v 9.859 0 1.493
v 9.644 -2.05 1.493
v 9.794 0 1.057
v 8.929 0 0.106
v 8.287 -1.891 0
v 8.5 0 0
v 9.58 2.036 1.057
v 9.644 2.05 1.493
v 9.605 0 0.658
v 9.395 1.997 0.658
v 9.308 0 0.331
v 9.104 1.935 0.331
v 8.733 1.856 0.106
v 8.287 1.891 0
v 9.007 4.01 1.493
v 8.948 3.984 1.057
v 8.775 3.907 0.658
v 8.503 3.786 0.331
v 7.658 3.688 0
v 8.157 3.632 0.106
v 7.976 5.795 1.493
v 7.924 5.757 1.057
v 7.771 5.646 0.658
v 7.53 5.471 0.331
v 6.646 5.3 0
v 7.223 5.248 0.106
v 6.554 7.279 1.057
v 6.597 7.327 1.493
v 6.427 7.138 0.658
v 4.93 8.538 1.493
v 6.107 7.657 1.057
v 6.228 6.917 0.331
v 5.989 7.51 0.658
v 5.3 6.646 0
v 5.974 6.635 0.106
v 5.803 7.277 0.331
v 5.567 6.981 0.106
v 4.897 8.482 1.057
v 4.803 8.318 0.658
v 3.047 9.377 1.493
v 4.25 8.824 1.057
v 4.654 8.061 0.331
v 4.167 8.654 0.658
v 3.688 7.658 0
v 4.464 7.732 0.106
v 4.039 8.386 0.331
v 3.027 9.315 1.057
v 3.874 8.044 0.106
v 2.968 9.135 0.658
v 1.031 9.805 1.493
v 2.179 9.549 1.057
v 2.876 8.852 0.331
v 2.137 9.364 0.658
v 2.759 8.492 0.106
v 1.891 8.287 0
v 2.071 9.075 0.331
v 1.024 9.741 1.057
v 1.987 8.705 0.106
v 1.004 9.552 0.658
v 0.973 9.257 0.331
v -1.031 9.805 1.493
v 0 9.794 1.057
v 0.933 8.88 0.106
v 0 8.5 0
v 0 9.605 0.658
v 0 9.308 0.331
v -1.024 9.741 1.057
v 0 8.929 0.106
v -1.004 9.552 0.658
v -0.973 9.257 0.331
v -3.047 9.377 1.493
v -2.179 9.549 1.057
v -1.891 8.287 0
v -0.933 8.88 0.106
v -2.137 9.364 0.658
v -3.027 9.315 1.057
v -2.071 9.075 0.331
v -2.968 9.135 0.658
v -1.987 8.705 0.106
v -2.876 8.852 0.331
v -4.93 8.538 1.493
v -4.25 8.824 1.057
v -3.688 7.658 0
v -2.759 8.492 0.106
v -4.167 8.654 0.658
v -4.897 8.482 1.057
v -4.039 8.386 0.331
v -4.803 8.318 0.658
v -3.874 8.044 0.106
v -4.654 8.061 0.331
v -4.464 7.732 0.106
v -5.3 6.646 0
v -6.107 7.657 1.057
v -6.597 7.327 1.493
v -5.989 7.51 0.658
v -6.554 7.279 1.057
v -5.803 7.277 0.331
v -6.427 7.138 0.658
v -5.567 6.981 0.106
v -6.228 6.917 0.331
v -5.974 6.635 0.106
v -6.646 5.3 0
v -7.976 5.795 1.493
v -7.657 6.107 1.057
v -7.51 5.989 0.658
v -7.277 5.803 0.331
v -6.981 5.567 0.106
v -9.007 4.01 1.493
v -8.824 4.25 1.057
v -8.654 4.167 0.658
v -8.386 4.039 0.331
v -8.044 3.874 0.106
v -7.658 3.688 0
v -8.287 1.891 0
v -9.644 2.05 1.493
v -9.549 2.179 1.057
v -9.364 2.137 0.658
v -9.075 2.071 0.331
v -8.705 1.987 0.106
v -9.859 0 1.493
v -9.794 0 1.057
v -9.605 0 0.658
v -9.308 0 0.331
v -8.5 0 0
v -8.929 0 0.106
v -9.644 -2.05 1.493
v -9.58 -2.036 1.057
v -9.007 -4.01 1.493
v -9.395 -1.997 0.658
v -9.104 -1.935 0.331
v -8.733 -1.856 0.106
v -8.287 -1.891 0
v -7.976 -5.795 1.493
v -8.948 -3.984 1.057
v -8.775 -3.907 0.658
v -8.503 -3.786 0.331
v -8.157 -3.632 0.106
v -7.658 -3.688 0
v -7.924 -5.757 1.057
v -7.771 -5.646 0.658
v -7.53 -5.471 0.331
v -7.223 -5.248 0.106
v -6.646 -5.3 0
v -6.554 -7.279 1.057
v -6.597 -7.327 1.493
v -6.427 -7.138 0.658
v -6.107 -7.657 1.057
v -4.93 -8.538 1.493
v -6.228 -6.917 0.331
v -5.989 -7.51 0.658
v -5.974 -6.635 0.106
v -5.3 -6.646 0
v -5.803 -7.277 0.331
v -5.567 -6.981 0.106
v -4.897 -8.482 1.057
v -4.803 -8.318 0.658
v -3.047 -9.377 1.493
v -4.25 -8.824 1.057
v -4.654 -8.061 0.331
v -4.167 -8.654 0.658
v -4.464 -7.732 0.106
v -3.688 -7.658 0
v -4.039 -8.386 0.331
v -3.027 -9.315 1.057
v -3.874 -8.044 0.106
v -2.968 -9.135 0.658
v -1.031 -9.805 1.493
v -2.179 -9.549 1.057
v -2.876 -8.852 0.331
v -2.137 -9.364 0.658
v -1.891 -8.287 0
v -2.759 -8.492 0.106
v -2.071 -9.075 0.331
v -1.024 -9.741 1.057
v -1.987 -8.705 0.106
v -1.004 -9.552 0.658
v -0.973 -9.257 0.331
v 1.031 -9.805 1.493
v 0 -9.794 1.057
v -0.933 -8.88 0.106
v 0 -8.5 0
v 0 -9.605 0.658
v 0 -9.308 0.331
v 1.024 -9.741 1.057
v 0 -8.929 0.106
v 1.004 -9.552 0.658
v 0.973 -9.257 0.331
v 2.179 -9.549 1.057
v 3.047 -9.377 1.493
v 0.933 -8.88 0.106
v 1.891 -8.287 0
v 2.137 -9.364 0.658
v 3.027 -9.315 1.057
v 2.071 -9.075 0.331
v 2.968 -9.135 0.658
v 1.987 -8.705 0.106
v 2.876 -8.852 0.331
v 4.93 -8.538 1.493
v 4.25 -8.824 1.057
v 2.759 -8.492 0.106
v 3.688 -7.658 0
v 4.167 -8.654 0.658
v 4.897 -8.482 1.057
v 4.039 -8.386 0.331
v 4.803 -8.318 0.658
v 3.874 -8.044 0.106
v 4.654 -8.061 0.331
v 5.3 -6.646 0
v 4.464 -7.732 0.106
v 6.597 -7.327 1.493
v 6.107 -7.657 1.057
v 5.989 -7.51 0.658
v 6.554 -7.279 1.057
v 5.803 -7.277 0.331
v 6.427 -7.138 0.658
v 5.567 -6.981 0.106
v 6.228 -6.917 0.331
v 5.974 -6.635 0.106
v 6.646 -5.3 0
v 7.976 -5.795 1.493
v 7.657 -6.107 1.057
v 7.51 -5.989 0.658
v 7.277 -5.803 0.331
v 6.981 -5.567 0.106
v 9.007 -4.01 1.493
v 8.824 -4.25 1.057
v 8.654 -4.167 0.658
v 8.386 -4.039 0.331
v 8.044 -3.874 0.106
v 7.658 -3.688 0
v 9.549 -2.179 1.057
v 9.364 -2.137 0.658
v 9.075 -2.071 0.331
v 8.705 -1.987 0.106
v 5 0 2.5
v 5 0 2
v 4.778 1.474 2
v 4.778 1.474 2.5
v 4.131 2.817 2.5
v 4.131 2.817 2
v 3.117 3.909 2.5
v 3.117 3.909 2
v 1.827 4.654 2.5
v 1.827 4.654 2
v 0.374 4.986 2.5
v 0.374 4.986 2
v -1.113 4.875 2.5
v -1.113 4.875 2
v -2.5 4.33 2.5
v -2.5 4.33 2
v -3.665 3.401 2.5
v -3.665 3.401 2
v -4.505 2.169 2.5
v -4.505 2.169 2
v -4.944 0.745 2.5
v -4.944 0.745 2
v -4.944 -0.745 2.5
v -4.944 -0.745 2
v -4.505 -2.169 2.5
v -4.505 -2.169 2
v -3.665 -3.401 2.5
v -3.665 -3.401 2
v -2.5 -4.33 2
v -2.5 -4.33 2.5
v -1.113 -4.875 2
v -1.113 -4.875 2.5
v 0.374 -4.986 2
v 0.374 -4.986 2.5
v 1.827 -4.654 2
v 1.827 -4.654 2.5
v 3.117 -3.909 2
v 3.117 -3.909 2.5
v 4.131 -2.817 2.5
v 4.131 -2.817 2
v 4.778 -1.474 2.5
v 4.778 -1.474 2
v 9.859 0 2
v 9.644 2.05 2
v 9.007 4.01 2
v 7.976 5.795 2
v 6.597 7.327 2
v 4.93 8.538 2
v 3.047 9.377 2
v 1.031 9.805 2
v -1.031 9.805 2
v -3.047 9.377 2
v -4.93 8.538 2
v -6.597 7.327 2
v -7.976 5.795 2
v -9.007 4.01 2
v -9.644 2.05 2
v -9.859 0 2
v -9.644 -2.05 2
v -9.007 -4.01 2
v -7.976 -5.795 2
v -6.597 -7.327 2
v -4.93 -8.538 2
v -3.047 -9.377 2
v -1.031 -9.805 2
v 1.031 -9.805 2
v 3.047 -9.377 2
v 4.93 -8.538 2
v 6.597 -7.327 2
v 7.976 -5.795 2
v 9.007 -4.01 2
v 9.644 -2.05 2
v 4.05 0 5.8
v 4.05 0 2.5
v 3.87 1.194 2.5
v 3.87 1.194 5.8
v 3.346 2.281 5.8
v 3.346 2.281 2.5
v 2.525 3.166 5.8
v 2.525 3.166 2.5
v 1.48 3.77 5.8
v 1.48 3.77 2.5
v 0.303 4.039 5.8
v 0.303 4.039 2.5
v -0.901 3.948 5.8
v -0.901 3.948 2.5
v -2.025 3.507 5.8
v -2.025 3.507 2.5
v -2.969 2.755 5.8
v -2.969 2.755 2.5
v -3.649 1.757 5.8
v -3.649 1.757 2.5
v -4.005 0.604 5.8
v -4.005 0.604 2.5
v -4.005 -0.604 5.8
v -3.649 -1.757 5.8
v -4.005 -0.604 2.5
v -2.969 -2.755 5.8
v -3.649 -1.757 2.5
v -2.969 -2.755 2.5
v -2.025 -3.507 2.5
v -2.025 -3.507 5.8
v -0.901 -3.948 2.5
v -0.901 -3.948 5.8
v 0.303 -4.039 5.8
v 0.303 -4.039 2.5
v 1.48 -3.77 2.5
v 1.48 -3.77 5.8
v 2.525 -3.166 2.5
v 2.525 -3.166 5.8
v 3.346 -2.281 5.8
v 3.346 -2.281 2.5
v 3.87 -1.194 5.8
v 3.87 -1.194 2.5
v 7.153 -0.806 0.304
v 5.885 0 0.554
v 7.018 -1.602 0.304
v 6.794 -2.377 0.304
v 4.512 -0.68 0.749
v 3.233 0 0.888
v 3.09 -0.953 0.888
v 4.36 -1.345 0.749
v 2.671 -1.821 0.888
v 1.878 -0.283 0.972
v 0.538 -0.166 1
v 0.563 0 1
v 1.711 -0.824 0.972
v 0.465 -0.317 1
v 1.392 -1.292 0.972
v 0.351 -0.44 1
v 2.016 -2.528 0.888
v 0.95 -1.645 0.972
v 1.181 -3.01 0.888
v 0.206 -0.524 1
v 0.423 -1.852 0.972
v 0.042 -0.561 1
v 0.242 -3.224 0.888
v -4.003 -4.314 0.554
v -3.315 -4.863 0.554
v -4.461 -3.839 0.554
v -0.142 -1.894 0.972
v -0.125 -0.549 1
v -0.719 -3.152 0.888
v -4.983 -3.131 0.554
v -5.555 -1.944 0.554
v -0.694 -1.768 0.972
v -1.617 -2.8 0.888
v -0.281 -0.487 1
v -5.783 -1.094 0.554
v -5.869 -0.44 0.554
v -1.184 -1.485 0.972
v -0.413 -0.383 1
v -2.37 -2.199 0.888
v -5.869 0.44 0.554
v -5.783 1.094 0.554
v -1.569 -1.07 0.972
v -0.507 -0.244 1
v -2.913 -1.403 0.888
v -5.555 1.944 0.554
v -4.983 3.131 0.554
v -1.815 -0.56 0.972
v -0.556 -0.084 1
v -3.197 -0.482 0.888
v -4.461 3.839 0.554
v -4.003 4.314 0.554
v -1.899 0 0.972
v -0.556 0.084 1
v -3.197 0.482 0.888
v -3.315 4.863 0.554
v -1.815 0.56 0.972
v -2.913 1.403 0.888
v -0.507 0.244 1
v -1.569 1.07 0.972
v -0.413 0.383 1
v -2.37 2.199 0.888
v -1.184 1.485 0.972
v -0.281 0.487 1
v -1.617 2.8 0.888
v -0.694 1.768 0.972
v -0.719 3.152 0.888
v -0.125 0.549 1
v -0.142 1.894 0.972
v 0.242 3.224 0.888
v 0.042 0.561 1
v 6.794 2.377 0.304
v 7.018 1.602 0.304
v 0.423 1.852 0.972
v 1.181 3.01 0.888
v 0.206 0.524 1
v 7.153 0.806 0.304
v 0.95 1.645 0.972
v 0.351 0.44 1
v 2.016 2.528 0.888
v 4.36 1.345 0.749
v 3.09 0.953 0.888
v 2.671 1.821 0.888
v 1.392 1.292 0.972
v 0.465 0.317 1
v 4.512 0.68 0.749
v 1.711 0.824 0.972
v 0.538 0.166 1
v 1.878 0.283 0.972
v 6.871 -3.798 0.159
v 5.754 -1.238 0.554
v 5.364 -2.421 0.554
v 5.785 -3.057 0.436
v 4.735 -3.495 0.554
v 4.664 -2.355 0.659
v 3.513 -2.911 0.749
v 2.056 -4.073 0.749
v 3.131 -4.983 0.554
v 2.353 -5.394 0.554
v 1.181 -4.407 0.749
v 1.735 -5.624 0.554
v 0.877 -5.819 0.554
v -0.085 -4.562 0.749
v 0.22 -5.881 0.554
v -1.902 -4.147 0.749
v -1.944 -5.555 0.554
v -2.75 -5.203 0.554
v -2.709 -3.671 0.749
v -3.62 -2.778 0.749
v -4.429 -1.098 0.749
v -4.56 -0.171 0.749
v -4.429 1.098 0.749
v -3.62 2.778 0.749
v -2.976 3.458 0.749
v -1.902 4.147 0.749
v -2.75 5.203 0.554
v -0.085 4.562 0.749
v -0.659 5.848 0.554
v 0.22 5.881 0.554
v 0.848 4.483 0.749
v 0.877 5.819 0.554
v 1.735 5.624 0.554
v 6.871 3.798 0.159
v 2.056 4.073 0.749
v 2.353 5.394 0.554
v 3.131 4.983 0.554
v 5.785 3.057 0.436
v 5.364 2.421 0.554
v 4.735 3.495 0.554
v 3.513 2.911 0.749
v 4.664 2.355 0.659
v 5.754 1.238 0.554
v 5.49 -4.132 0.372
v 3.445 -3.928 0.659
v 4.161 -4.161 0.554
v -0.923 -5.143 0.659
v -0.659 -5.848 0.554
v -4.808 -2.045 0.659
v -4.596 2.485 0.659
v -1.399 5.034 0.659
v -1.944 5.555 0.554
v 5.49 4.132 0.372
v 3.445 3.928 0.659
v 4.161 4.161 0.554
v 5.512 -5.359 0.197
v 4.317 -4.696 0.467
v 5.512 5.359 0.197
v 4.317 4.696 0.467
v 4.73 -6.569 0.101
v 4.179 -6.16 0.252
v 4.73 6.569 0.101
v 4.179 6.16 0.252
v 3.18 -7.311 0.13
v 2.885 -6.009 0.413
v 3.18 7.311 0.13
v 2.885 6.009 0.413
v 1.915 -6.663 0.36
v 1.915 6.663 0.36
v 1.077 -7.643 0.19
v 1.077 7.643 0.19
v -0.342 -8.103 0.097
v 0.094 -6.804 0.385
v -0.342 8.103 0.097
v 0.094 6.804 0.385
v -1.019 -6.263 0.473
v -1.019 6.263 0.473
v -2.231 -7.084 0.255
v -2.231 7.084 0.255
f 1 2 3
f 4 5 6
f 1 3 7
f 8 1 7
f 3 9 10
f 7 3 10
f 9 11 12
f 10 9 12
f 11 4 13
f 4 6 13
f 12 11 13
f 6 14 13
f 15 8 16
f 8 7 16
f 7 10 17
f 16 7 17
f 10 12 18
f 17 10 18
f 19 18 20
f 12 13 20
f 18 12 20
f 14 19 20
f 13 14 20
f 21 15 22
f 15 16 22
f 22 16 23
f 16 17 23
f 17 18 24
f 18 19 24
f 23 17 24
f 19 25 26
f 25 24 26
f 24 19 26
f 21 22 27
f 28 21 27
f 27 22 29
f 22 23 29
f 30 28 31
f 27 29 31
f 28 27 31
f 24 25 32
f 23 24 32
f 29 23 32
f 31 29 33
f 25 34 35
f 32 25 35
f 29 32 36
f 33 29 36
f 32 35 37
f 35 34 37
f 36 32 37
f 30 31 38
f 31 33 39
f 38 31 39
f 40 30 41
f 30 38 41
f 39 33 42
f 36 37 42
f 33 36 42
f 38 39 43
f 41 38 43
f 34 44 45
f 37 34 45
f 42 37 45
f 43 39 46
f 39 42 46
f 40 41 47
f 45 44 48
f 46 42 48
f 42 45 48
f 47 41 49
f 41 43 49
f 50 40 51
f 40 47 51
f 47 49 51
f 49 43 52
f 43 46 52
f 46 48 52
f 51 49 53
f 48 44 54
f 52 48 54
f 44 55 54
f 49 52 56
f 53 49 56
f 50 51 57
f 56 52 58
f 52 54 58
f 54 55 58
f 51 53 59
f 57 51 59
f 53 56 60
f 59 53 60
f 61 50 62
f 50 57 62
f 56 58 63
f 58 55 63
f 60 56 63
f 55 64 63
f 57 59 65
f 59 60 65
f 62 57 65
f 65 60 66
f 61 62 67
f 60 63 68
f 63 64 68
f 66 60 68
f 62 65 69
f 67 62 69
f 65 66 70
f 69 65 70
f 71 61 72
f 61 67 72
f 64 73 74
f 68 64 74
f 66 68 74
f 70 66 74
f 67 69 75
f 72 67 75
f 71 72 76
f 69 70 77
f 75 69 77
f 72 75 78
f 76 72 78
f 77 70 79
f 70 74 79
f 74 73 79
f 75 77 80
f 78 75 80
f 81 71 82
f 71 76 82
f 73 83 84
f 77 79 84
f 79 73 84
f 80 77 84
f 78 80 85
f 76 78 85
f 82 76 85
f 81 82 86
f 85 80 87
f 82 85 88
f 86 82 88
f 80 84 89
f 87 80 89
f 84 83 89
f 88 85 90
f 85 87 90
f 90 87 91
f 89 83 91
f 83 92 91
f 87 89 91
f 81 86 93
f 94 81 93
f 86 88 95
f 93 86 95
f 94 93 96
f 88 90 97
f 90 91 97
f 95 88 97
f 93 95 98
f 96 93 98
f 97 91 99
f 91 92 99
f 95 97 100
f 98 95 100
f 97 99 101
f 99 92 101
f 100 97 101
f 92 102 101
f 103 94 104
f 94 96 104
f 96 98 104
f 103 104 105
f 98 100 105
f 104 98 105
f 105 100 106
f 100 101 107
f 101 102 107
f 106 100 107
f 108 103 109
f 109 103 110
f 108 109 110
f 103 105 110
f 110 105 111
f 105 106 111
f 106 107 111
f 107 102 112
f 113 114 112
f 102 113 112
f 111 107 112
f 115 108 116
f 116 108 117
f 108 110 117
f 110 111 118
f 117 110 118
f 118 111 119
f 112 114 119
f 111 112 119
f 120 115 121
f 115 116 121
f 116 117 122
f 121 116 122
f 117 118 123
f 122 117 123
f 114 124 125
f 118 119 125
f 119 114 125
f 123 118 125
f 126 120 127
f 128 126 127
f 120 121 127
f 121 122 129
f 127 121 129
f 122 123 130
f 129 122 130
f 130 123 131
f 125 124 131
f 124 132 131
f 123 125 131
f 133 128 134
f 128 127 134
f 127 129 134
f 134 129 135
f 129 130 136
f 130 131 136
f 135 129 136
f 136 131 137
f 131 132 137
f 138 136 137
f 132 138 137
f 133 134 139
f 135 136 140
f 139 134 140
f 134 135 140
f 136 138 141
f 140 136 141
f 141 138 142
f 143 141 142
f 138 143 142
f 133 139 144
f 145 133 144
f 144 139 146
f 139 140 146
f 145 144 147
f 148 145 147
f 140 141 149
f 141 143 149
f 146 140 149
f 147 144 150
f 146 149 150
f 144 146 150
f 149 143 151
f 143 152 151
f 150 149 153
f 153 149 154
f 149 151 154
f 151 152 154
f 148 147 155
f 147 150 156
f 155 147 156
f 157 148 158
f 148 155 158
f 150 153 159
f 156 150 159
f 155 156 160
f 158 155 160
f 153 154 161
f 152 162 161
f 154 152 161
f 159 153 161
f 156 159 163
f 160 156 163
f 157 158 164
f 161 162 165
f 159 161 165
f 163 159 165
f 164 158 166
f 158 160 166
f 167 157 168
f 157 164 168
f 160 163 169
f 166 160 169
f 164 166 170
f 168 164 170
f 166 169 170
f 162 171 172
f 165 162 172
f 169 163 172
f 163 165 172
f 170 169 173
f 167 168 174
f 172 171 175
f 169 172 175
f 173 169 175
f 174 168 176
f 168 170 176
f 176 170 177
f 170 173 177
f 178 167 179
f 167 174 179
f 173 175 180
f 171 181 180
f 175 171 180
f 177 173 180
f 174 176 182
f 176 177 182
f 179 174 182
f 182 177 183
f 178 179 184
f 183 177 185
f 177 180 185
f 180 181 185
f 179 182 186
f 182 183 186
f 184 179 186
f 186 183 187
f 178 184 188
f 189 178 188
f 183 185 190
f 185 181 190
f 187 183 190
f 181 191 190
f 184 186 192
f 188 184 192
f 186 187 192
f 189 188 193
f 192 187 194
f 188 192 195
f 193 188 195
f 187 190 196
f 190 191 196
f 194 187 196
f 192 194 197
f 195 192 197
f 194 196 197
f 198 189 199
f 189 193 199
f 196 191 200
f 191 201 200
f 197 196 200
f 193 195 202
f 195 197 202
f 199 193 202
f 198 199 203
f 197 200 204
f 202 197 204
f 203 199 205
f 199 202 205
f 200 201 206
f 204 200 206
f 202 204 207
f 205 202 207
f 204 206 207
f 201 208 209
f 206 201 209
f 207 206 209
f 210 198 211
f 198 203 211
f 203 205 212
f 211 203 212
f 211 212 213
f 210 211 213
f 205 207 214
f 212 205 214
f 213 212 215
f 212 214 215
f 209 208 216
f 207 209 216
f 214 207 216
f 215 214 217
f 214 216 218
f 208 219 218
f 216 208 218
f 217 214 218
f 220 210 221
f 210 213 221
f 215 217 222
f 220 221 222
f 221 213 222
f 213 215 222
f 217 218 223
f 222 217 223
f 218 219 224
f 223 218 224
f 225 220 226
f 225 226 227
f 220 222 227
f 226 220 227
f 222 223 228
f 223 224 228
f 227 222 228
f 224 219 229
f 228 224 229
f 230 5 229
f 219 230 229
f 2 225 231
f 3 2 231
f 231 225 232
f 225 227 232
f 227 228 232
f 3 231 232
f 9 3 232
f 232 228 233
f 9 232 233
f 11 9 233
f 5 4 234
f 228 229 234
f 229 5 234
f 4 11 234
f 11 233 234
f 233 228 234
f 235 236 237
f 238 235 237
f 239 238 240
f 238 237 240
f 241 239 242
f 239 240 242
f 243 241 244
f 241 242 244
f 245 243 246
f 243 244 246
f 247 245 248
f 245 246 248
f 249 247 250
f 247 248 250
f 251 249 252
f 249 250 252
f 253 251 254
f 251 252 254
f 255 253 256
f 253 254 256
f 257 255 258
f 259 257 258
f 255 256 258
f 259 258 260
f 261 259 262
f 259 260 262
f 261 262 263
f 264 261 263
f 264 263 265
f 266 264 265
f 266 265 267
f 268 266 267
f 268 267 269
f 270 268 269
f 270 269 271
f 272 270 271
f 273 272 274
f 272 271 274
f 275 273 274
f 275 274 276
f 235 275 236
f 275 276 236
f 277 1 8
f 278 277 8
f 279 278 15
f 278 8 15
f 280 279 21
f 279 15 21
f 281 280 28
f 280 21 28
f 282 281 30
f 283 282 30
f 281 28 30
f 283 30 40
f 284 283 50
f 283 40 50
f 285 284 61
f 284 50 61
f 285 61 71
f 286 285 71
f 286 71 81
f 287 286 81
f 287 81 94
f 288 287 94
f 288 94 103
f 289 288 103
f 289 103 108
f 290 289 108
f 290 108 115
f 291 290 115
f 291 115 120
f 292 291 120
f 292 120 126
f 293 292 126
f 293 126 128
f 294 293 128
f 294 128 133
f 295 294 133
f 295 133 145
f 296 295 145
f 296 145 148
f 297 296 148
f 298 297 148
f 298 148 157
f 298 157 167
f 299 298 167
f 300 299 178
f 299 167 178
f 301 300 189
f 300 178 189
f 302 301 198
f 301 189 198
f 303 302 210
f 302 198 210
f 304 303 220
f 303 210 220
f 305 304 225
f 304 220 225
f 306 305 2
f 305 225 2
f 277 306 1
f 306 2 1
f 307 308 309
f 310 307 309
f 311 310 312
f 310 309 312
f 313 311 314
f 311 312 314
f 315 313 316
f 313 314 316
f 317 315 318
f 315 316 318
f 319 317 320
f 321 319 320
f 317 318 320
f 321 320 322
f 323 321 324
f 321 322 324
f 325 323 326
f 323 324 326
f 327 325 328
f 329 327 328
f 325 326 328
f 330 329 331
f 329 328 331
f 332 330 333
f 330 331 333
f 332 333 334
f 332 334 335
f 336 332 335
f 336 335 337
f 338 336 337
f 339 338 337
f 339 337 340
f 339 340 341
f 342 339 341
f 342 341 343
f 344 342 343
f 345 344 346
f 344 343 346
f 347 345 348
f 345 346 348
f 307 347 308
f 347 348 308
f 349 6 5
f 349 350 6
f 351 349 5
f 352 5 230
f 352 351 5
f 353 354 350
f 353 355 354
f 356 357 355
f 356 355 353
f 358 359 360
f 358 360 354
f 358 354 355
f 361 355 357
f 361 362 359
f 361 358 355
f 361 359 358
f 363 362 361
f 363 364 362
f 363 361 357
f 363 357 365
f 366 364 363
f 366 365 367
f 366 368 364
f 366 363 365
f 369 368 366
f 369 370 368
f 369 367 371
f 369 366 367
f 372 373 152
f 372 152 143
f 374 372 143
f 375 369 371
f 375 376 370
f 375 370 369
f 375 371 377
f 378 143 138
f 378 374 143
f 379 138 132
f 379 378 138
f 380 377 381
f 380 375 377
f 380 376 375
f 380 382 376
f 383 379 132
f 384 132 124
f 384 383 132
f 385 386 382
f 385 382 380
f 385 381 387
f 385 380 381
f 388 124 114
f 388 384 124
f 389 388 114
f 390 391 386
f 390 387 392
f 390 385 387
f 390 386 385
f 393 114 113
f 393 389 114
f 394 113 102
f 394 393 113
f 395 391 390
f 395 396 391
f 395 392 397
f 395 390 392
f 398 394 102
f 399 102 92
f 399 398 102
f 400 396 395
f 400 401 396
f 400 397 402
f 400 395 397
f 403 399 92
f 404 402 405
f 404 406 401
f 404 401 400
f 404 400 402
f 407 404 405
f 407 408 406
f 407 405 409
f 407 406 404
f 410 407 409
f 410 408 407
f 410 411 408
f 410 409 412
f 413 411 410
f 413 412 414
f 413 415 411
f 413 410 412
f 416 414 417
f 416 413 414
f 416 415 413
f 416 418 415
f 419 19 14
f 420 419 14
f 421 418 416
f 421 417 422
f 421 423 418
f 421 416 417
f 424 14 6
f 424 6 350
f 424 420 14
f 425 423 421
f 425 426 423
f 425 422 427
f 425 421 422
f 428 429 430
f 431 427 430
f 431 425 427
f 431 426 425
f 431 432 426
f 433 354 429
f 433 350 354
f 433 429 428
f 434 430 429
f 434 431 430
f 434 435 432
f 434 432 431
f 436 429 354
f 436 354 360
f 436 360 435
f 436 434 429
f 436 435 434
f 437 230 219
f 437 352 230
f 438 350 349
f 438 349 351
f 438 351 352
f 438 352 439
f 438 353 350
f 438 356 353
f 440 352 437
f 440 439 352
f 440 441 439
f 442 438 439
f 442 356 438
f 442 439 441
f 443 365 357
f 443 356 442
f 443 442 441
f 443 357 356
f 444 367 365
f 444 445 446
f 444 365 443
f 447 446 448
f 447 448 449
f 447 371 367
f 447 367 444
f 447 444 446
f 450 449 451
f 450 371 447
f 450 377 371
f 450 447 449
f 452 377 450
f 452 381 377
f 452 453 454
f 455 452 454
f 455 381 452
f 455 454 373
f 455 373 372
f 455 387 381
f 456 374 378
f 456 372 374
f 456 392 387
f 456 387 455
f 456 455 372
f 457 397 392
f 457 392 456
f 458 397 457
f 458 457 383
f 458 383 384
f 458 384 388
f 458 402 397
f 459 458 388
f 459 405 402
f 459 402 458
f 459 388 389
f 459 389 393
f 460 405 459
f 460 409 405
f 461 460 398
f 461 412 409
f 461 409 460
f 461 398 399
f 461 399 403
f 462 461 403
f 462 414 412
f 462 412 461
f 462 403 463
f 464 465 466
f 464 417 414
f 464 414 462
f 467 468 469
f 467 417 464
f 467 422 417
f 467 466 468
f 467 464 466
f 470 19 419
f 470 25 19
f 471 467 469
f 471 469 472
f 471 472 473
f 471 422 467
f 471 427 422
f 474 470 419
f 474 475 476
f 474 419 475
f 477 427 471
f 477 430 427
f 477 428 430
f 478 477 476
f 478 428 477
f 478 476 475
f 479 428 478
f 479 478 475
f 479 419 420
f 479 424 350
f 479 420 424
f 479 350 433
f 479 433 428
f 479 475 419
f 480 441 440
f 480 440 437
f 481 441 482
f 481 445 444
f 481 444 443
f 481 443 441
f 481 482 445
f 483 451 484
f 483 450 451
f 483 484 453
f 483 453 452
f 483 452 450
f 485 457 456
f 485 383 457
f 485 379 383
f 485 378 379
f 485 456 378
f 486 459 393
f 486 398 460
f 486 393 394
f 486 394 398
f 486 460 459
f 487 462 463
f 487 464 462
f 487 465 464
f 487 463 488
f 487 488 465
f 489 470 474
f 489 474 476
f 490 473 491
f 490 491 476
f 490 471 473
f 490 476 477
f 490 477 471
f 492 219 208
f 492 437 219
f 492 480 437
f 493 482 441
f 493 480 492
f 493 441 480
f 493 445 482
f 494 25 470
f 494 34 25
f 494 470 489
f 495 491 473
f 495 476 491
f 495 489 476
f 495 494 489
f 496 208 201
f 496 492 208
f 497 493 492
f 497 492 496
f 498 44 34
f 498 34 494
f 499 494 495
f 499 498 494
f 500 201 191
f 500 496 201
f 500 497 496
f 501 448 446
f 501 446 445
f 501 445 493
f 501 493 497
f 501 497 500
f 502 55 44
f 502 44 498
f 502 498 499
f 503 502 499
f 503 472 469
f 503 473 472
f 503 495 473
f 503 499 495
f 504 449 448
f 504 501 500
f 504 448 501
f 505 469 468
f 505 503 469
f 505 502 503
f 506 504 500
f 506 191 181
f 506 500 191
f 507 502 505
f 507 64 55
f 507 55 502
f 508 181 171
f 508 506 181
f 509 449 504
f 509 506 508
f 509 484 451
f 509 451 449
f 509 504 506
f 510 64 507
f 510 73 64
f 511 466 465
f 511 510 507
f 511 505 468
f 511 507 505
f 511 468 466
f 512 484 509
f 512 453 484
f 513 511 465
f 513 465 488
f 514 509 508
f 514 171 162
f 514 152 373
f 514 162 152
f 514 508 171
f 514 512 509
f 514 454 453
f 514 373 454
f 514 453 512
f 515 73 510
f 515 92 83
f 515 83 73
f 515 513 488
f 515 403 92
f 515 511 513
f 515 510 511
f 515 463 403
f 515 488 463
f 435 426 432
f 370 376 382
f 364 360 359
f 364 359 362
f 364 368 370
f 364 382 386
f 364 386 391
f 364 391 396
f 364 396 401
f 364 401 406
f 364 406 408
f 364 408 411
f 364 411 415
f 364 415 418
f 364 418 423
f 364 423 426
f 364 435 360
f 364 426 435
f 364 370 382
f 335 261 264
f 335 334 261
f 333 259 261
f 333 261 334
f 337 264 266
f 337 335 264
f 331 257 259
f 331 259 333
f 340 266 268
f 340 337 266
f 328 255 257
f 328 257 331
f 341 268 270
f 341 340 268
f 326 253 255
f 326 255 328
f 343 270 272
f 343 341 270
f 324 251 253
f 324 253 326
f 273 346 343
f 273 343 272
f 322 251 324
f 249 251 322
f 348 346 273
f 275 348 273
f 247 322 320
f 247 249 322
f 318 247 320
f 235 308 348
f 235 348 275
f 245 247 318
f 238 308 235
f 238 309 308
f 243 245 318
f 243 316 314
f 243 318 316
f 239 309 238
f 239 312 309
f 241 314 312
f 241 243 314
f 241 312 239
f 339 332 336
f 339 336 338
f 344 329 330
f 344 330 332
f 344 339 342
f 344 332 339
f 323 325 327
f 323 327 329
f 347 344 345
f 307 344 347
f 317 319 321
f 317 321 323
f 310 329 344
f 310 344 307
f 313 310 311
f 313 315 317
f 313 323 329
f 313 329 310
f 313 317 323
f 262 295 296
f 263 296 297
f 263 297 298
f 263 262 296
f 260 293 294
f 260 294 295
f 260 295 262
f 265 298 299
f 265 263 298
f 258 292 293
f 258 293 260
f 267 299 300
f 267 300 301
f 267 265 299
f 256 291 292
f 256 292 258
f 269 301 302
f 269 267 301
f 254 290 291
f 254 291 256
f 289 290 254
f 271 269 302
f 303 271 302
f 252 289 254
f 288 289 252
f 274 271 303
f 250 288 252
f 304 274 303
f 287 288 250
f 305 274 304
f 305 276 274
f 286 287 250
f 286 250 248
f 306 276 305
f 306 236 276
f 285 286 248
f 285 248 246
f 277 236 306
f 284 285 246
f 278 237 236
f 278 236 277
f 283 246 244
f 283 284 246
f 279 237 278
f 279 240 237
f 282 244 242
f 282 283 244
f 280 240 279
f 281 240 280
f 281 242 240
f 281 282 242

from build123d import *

# Parameters (mm, degrees)
F0_R     = 9.8592181747
F1_DEPTH = 2
F2_R     = 5
F3_DEPTH = 0.5
F4_R     = 4.05
F5_DEPTH = 3.3
F6_R     = 8.5
F7_DEPTH = 1


# Not quite as in the source:
# - a fillet or chamfer that OpenCascade refuses, or shapes differently, is made with other operations: its cross-section is extruded or revolved along the edge and cut away or added


with BuildPart() as f1:
    # F0 (on Top) → F1 (new body)
    with BuildSketch(Plane.XY):
        Circle(F0_R)
    extrude(amount=F1_DEPTH)

    # F2 (on face) → F3 (join)
    with BuildSketch(Plane.XY.offset(2)):
        Circle(F2_R)
    extrude(amount=F3_DEPTH)

    # F4 (on face) → F5 (join)
    with BuildSketch(Plane.XY.offset(2.5)):
        Circle(F4_R)
    extrude(amount=F5_DEPTH)

    # F6 (on face) → F7 (cut)
    with BuildSketch(Plane(origin=(0, 0, 0), x_dir=(1, 0, 0), z_dir=(0, 0, -1))):
        Circle(F6_R)
    extrude(amount=-F7_DEPTH, mode=Mode.SUBTRACT)

    # F8: fillet of radius 32 on 1 edges, made by hand

    # F8_s1 → F8_t2 (revolve)
    with BuildSketch(Plane.XZ):
        with BuildLine():
            ThreePointArc((8.5, 0), (4.5627460668, 0.7490157328), (0.5627460668, 1))
            Line((0.5627460668, 1), (8.5, 1))
            Line((8.5, 1), (8.5, 0))
        make_face()
    revolve(axis=Axis((0, 0, 1), (0, 0, -1)))

    # F9: fillet of radius 1.5 on 1 edges, made by hand

    # F9_s1 → F9_t2 (revolve, cut)
    with BuildSketch(Plane.XZ):
        with BuildLine():
            ThreePointArc((9.8592181747, 1.4933788795), (9.4685361494, 0.4837187233), (8.5, 0))
            Line((8.5, 0), (9.8592181747, 0))
            Line((9.8592181747, 0), (9.8592181747, 1.4933788795))
        make_face()
    revolve(axis=Axis((0, 0, 0), (0, 0, 1)), mode=Mode.SUBTRACT)


solid = f1.part
